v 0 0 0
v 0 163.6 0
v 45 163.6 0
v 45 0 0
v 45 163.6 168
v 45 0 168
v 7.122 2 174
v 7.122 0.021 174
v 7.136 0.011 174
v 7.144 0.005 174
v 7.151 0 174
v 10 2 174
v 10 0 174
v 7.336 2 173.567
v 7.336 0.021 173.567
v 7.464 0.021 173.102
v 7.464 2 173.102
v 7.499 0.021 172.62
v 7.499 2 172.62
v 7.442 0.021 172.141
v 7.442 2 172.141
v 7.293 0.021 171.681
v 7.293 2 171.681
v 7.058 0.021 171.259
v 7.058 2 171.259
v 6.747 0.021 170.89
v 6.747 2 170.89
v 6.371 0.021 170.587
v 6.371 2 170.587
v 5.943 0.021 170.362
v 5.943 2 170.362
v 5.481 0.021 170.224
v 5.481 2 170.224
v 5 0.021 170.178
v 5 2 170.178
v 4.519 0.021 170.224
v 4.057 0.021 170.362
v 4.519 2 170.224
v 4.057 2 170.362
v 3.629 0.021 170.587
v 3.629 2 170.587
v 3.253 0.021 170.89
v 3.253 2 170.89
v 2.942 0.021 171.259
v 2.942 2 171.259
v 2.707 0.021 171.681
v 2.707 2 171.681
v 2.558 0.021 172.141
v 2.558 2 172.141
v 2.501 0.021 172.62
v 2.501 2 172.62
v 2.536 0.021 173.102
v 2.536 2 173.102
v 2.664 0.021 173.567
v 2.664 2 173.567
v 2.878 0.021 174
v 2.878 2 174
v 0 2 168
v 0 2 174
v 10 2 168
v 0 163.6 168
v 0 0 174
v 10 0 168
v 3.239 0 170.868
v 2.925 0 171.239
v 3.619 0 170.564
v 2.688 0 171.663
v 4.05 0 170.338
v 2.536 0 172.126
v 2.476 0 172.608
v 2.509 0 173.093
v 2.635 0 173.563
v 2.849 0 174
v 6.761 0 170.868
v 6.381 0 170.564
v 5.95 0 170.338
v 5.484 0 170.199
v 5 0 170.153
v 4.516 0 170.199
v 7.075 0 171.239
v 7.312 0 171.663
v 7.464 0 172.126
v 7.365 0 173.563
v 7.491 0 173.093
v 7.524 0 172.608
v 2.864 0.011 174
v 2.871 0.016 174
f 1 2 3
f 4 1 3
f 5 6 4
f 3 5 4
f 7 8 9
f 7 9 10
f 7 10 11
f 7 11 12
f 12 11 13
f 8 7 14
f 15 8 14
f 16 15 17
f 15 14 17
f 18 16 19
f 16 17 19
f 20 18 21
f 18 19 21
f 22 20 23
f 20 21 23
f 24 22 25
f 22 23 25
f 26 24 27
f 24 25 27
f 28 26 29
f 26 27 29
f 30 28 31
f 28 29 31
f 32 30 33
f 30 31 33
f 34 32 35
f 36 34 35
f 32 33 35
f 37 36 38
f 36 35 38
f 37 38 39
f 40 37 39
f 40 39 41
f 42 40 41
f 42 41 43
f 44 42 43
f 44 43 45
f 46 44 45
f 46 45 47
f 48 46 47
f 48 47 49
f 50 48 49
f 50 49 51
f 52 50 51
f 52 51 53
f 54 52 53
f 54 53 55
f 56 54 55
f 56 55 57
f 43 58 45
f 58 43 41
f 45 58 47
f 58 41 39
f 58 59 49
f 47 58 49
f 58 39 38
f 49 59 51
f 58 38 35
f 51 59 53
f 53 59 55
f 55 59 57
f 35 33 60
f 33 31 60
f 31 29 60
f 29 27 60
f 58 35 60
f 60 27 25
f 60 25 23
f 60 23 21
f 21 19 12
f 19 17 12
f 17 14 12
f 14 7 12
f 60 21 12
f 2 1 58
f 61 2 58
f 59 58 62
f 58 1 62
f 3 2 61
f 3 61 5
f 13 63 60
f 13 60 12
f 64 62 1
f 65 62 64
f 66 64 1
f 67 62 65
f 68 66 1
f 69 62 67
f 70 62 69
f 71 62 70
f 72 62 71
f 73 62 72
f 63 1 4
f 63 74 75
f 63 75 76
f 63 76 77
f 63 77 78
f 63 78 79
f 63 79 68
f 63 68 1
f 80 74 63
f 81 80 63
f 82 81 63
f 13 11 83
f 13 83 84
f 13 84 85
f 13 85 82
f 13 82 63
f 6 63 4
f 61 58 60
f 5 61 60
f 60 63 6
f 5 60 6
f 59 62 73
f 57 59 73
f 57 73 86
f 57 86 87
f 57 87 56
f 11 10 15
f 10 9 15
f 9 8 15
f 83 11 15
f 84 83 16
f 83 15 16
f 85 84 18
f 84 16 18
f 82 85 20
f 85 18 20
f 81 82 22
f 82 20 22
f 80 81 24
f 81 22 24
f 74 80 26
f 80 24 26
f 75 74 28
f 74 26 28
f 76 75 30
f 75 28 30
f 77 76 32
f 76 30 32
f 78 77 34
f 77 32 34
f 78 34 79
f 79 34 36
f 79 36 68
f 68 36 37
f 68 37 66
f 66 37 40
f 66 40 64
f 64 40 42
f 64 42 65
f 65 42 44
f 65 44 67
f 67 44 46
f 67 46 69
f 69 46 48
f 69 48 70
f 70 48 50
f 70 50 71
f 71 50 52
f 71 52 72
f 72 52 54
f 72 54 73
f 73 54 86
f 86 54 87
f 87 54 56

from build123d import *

# Parameters (mm, degrees)
SKETCH_1_W            = 45
SKETCH_1_H            = 168
EXTRUDE_1_DEPTH       = 163.6
SKETCH_2_W            = 10
SKETCH_2_H            = 6
EXTRUDE_2_DEPTH       = 2
F_5_0MM_1_D           = 5
F_5_0MM_1_CSINK_D     = 5.05
F_5_0MM_1_CSINK_ANGLE = 100


with BuildPart() as part:
    # 草图1 → 凸台-拉伸1 (new body)
    with BuildSketch(Plane(origin=(0, 0, 0), x_dir=(1, 0, 0), z_dir=(0, 1, 0))):
        with Locations((22.5, -84)):
            Rectangle(SKETCH_1_W, SKETCH_1_H)
    extrude(amount=EXTRUDE_1_DEPTH)

    # 草图2 → 凸台-拉伸2 (add)
    with BuildSketch(Plane.XZ):
        with Locations((5, 171)):
            Rectangle(SKETCH_2_W, SKETCH_2_H)
    extrude(amount=-EXTRUDE_2_DEPTH)

    # Ø5.0mm 暗销孔1 (through all)
    with Locations(Plane(origin=(0, 0, 0), x_dir=(-1, 0, 0), z_dir=(0, -1, 0))):
        with Locations((-5, -172.677656)):
            CounterSinkHole(F_5_0MM_1_D / 2, F_5_0MM_1_CSINK_D / 2, counter_sink_angle=F_5_0MM_1_CSINK_ANGLE)


solid = part.part
